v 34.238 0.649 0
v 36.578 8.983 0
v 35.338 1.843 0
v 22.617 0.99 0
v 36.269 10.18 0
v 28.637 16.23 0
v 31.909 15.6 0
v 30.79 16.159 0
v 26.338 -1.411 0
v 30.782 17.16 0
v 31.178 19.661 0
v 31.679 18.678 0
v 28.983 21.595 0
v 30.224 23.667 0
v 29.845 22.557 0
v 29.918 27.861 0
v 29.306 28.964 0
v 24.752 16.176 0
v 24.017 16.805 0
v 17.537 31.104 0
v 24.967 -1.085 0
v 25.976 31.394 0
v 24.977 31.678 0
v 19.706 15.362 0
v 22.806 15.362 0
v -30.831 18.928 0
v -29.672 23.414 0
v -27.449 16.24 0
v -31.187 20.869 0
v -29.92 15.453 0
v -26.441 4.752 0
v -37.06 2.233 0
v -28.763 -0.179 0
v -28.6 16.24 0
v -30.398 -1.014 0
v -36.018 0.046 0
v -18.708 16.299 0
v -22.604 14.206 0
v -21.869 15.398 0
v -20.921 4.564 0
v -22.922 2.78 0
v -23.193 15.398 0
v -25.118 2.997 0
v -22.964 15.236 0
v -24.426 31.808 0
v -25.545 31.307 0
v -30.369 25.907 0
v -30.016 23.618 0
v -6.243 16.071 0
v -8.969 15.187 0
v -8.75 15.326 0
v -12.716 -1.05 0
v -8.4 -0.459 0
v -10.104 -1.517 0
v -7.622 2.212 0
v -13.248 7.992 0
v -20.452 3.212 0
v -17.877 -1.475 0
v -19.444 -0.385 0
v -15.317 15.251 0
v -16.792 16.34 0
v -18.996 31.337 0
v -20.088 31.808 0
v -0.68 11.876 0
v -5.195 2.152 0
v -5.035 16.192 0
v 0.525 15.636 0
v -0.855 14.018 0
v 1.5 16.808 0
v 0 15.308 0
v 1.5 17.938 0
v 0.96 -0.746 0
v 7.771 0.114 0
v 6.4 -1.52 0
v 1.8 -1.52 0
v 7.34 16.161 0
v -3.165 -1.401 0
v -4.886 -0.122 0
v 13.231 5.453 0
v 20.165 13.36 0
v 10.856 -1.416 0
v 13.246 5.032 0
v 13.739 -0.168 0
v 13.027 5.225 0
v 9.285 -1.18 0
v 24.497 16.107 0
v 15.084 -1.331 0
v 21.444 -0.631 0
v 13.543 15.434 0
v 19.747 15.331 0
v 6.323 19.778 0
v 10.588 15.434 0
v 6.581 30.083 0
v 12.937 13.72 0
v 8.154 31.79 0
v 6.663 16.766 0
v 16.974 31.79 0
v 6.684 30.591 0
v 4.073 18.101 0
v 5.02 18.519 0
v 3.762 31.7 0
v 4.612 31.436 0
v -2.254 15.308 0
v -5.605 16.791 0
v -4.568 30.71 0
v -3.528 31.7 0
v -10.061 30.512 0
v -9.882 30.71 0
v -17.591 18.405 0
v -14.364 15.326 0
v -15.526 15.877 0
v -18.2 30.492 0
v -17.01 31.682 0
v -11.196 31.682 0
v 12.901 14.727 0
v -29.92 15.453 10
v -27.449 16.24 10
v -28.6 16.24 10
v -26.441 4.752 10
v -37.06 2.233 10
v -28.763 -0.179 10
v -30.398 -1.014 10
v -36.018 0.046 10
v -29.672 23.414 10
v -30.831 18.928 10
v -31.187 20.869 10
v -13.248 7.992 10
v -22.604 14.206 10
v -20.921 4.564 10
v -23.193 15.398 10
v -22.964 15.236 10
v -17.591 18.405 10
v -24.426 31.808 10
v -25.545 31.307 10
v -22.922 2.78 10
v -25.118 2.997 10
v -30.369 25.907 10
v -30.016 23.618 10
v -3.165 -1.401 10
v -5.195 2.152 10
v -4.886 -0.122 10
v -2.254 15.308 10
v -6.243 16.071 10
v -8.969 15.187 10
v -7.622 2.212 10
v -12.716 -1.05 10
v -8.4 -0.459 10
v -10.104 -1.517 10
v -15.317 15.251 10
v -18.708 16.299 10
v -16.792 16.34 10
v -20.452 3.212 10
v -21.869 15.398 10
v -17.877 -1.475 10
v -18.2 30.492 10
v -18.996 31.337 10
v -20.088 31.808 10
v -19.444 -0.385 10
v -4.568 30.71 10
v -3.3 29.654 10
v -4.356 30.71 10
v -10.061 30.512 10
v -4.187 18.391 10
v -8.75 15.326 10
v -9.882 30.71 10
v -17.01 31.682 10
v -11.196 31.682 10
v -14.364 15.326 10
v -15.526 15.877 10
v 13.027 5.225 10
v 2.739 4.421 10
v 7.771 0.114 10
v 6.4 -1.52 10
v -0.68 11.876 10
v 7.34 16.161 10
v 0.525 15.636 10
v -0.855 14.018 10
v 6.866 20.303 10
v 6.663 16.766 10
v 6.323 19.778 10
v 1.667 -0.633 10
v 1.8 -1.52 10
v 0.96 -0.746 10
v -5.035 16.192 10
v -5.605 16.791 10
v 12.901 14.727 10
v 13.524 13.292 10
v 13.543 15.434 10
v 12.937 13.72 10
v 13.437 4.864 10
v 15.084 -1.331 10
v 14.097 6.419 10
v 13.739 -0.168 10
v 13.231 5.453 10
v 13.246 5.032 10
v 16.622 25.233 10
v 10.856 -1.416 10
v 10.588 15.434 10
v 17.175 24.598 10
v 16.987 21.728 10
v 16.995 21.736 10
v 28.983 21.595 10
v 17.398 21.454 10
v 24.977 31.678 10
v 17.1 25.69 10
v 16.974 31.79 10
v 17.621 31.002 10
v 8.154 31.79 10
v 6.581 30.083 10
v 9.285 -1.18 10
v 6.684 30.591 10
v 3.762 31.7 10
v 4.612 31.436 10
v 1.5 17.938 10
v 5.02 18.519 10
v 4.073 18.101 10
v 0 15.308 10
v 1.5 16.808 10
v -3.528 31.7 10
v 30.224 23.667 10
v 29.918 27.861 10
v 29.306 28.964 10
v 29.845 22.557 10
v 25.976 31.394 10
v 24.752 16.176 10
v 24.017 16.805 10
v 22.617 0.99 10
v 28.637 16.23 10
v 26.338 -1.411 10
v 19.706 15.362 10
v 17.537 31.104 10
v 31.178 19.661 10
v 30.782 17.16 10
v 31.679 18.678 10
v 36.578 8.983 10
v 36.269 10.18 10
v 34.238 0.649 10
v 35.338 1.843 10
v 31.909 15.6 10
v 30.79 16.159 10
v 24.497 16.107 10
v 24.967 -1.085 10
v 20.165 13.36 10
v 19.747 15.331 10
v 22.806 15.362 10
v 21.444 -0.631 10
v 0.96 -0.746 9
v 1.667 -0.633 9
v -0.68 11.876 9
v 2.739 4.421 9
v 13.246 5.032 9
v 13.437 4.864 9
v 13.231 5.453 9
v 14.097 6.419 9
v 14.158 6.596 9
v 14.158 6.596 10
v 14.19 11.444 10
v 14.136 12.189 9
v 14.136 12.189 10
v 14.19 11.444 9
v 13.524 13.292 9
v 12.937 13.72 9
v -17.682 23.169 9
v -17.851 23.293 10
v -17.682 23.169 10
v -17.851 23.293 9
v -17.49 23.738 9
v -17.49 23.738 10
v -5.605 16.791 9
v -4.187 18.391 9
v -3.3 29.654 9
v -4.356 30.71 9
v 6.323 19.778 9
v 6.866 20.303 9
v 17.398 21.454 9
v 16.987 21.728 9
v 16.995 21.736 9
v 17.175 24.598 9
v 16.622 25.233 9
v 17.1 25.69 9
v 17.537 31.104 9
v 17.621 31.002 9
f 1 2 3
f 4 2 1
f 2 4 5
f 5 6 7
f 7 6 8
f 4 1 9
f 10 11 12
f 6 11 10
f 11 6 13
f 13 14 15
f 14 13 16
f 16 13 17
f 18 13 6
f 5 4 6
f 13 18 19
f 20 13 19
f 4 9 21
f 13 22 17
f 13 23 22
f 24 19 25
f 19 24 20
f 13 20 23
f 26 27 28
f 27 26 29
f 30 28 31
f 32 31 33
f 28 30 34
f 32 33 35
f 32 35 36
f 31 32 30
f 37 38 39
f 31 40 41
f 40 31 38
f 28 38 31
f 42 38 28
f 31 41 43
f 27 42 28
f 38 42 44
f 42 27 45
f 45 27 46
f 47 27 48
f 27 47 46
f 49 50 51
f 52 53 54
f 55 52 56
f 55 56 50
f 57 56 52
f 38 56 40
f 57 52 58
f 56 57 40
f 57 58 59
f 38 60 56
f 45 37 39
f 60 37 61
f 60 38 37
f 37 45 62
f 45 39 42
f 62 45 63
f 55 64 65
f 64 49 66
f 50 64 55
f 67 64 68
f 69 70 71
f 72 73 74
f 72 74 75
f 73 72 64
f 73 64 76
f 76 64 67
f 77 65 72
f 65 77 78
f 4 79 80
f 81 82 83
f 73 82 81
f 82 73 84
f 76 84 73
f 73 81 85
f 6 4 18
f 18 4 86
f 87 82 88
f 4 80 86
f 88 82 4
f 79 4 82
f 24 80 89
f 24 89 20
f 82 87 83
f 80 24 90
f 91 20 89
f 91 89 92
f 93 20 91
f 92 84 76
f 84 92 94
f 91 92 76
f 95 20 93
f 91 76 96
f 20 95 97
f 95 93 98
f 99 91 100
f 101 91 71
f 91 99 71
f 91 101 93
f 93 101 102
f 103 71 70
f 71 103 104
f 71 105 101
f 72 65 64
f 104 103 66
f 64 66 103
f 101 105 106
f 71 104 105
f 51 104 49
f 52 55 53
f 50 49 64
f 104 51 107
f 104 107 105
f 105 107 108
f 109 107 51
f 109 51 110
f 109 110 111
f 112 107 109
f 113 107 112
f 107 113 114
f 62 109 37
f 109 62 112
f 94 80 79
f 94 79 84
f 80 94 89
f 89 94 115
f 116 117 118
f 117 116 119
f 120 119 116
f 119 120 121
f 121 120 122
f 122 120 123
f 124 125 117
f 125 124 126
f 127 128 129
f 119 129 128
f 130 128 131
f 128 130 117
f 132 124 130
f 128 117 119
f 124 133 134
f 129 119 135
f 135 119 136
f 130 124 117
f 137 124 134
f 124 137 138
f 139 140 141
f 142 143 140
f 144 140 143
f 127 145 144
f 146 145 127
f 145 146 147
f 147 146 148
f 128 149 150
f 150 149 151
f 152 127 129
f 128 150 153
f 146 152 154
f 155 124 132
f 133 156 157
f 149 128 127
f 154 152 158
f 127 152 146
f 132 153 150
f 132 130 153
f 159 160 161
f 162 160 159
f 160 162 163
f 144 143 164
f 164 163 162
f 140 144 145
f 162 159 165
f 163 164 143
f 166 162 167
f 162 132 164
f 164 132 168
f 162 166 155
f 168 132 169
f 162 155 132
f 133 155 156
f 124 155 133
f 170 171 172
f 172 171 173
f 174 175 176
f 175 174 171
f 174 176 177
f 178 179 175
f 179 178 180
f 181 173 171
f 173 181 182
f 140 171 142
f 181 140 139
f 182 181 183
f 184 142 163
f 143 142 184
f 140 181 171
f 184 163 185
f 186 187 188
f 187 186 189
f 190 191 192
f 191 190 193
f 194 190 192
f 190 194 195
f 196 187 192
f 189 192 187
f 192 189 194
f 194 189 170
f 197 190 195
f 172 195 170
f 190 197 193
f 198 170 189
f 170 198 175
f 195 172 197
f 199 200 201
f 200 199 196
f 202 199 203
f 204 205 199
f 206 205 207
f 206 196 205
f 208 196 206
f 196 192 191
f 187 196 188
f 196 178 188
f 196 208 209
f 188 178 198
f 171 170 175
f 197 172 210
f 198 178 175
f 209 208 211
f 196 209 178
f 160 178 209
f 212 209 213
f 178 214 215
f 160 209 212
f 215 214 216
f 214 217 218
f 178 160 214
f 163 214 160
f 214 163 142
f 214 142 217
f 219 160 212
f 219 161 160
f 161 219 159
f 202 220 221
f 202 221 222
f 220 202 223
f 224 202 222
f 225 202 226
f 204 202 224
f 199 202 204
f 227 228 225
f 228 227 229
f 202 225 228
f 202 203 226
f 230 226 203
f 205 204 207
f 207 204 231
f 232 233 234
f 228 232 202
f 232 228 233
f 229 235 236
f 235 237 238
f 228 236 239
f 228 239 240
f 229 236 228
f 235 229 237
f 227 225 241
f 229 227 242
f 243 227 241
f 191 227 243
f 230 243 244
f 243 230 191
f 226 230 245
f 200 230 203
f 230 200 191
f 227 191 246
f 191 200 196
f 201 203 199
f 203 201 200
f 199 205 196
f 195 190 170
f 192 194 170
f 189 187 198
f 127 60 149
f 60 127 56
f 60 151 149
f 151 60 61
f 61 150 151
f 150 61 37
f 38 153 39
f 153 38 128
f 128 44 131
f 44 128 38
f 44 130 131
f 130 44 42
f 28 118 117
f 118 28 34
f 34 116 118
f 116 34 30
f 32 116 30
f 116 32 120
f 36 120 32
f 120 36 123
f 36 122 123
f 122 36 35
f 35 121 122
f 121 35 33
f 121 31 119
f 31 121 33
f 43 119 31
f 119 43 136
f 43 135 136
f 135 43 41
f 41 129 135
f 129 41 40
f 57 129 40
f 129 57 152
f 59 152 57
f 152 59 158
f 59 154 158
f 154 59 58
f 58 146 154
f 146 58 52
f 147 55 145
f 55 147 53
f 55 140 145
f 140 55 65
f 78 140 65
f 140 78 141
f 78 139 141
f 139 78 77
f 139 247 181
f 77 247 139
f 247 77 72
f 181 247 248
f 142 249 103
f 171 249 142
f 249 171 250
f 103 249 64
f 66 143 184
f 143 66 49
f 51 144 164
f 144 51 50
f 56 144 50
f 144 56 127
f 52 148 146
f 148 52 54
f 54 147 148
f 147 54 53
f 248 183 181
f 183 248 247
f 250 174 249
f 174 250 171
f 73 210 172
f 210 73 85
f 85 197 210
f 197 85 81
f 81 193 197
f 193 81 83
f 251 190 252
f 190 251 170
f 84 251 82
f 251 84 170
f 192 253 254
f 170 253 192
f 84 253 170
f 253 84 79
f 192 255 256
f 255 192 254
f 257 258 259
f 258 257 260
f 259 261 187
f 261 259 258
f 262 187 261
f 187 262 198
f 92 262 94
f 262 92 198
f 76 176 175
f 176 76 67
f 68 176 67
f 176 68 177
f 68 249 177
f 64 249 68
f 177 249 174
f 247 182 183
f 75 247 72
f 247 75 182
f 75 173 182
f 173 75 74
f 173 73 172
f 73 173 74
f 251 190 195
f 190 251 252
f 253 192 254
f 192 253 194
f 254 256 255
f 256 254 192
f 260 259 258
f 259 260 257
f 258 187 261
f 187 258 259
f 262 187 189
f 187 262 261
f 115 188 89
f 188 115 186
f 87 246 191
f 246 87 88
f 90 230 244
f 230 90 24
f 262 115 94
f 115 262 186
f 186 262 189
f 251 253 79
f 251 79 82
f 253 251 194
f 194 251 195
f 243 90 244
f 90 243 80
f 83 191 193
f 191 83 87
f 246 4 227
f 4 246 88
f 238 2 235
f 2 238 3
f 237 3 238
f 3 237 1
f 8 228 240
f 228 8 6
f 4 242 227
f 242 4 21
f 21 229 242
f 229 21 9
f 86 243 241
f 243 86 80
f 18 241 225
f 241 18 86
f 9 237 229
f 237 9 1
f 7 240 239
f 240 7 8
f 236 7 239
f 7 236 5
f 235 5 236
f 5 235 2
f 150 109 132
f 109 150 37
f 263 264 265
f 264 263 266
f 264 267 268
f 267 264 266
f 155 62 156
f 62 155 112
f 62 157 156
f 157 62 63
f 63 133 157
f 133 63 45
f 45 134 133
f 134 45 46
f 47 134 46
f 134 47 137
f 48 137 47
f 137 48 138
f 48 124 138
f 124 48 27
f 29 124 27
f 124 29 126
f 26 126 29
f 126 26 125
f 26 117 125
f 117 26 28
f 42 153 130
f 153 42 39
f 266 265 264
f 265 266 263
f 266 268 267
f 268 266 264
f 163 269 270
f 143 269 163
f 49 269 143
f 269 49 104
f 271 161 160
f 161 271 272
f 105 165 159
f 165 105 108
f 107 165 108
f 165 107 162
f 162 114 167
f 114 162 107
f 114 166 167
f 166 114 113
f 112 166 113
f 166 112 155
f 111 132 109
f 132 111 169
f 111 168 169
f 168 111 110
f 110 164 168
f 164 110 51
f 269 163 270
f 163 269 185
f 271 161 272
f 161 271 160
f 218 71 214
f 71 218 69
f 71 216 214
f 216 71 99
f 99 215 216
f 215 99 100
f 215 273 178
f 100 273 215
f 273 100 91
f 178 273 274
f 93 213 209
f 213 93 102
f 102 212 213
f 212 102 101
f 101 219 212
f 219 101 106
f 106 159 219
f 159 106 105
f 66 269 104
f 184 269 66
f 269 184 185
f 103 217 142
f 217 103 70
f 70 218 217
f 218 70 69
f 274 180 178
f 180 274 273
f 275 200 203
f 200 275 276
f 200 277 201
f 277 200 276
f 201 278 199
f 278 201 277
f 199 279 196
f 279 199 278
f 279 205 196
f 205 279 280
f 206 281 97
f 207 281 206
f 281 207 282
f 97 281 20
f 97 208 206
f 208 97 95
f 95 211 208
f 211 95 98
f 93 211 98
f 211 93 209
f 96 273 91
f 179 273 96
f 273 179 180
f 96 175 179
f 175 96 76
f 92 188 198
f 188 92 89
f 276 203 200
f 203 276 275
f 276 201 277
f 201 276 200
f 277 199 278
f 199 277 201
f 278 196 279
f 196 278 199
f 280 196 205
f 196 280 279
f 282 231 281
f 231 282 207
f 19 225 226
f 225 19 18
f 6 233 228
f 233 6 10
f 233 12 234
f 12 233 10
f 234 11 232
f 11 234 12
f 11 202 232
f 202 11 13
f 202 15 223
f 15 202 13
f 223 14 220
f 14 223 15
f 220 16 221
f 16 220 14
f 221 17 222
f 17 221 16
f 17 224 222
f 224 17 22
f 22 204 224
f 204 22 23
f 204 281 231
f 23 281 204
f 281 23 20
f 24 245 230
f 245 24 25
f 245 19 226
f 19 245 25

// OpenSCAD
// Choose your custom words and write them in UPPERCASE.
// If you want only one line, you can leave the second word empty.
word1 = "SUPER";
word2 = "MARIO";

// The following values are model constants and are not intended to be changed by the end user.
//-----------------
// [Fixed design parameters]

// Scale factor for the first word (word1)
scale_word1 = 1.8;

// Scale factor for the second word (word2)
scale_word2 = 2.0;

// Height of the extruded letters
scale_height = 5.0;

// Height of the brim (the base outline under the letters)
brim_height = 10;

// Radius/offset for the brim outline
brim_radius = 1.5;

// Vertical gap between the two words
gap = 2;

// Horizontal spacing between letters
spacing = 0.0;

// Thickness of the base of the brim
bottom_thickness = 10.00001;

// Small tolerance to help letters fit into the brim
wiggle = 0.1;




//-----------------

// Path data for each letter and symbol, used to draw the glyphs
// Each glyph is a list of 2D points (x, y), divided by 100 for scaling
glyph_A = [
    [449, 741], [765, 52], [463, 4], [439, 181], [196, 187], [141, -2], [-150, 50], [249, 721], [449, 741]
]/100;
glyph_B = [
    [138, 747], [485, 706], [565, 578], [559, 441], [507, 363], [580, 321], [629, 178], [573, 45], [457, 4], [21, 1], [1, 704], [138, 747]
]/100;
glyph_C = [
    [287, 744], [563, 726], [552, 461], [372, 545], [215, 472], [208, 302], [346, 208], [549, 314], [617, 35], [218, 0], [23, 171], [-35, 386], [55, 617], [287, 744]
]/100;
glyph_D = [
    [368, 744], [578, 572], [621, 171], [414, 2], [0, 2], [0, 699], [368, 744]
]/100;
glyph_E = [
    [54, 745], [544, 745], [503, 538], [262, 501], [259, 450], [472, 434], 
    [462, 275], [272, 258], [289, 204], [520, 202], [605, 3], [54, 3], 
    [0, 481], [54, 745]
]/100;
glyph_F = [
    [49, 746], [553, 742], [525, 501], [250, 532], [246, 452], [479, 464], [441, 244], [246, 269], [288, 3], [22, 3], [1, 543], [49, 746]
]/100;
glyph_G = [
    [627, 591], [456, 495], [387, 533], [285, 502], [224, 357], [288, 222], [472, 244], [476, 277], [334, 264], [352, 465], [648, 461], [648, 66], [151, 2], [0, 309], [55, 591], [267, 745], [527, 727], [627, 591]
]/100;
glyph_H = [
    [0, 698], [252, 746], [264, 441], [411, 463], [420, 732], [626, 723], [666, 5], [434, 13], [432, 238], [292, 211], [297, 5], [80, 5],
    [0, 698]
]/100;
glyph_I = [
    [5, 739], [199, 751], [349, 43], [31, 8], [5, 739]
]/100;
glyph_J = [
    [0, 739], [219, 744], [658, 724], [658, 528], [459, 509],
    [533, 162], [430, 32], [235, 0], [18, 0], [25, 220],
    [263, 237], [236, 509], [0, 528], [0, 739]
]/100;
glyph_K = [
    [14, 741], [223, 741], [218, 539], [375, 718], [518, 566],
    [337, 369], [605, 178], [440, 0], [216, 243], [257, -2],
    [0, -2], [14, 741]
]/100;
glyph_L = [
    [278, 717], [249, 269], [556, 306], [584, 75], [28, 9],
    [0, 749], [278, 717]
]/100;
glyph_M = [
    [0, 76], [357, 737], [568, 737], [638, 537], [762, 738],
    [949, 742], [1154, 23], [887, 1], [836, 183], [775, 359],
    [591, 195], [450, 382], [281, 23], [0, 76]
]/100;
glyph_N = [
    [0, 13], [133, 742], [284, 742], [425, 510], [437, 742],
    [669, 706], [620, 4], [428, 16], [280, 242], [237, 3],
    [0, 13]
]/100;
glyph_O = [
    [522, 733], [740, 462], [678, 105], [283, 2], [-32, 280],
    [15, 593], [250, 742], [522, 733]
]/100;
glyph_P = [
    [442, 740], [618, 619], [632, 323], [454, 151], [233, 137], [233, -4], [0, -4], [37, 740], [442, 740]
]/100;
glyph_Q =[
    [531, 731], [721, 478], [653, 216], [797, 84], [621, -2], [535, 61], [238, -3], [-21, 243], [26, 593], [260, 740], [531, 731]
]/100;
glyph_R = [
    [415, 739], [600, 604], [617, 371], [513, 255], [698, 92], [481, -2], [254, 192], [288, -1], [58, -1], [0, 707], [415, 739]
]/100;
glyph_S = [
    [725, 556], [596, 397], [445, 494], [407, 446], [677, 248], [546, 1], [225, 1], [1, 179], [98, 342], [291, 233],
    [320, 278], [37, 446], [305, 746], [546, 746], [725, 556]
]/100;
glyph_T = [
    [0, 742], [739, 729], [739, 429], [489, 470], [558, -1], [200, -1], [254, 470], [0, 483], [0, 742]
]/100;
glyph_U = [
    [-9, 739], [314, 739], [299, 234], [424, 324], [387, 685], [694, 685], [694, 199], [515, -3], [138, -3], [-9, 177], [-9, 739]
]/100;
glyph_V = [
    [0, 745], [259, 731], [362, 284], [401, 334], [512, 731], [799, 745], [517, 3], [169, 29], [0, 745]
]/100;
glyph_W = [
    [1028, 675], [709, 6], [523, 6], [454, 207], [352, 5], [182, 0], [0, 723], [238, 744], [283, 562], [337, 385], [502, 550], [627, 362], [778, 729], [1028, 675]
]/100;
glyph_X = [
    [200, 739], [357, 579], [473, 750], [663, 568], [525, 405], [753, 226], [563, 7], [399, 221], [191, 12], [0, 201], [221, 400], [53, 588], [200, 739]
]/100;
glyph_Y = [
    [71, 733], [236, 557], [391, 753], [610, 588], [371, 380], [548, 13], [156, 31], [156, 350], [-93, 588], [71, 733]
]/100;
glyph_Z = [
    [617, 3], [0, 28], [0, 228], [248, 486], [0, 471], [44, 748], [625, 707], [614, 517], [386, 265], [625, 300], [617, 3]
]/100;
glyph_0 = [
    [381, 732], [552, 531], [497, 90], [224, 1], [3, 223], [48, 606], [202, 742], [381, 732], [560, 732]
]/100;
glyph_1 = [
    [527, 727], [468, 205], [679, 232], [713, 1], [0, 1], [20, 218], [258, 205], [258, 476], [133, 397], [0, 578], [269, 741], [527, 741]
]/100;
glyph_2 = [
    [4, 605], [211, 742], [392, 741], [544, 629], [610, 352], [411, 221], [629, 239], [686, 1], [110, 9], [34, 156], [330, 390], [309, 454], [261, 492], [140, 409], [4, 605]
]/100;
glyph_3 = [
    [1, 607], [178, 740], [403, 708], [511, 522], [441, 421], [528, 357], [534, 131], [415, 1], [148, 26], [1, 175], [120, 291], [220, 197], [314, 222], [317, 279], [170, 329], [176, 419], [295, 498], [264, 531], [97, 454], [1, 607]
]/100;
glyph_4 = [
    [531, 409], [689, 402], [689, 223], [548, 214], [575, 31], [318, 4], [314, 214], [8, 214], [4, 400], [208, 747], [487, 728], [531, 409]
]/100;
glyph_5 = [
    [572, 741], [530, 543], [247, 546], [253, 501], [415, 495], [610, 389], [609, 166], [534, 45], [189, 10], [7, 95], [88, 248], [212, 205], [324, 200], [368, 251], [318, 298], [91, 293], [10, 433], [0, 724], [572, 741]
]/100;
glyph_6 = [
    [154, 719], [335, 746], [515, 709], [447, 499], [286, 559], [211, 500], [202, 444], [416, 438], [501, 300], [499, 120], [380, 1], [136, 1], [0, 120], [0, 371], [28, 575], [154, 719]
]/100;
glyph_7 = [
    [0, 740], [641, 726], [524, -3], [234, 66], [393, 501], [51, 473], [0, 740]
]/100;
glyph_8 = [
    [461, 716], [533, 519], [446, 450], [562, 355], [577, 61], [414, -3], [154, -3], [0, 87], [17, 351], [139, 444], [46, 519], [116, 745], [461, 716]
]/100;
glyph_9 = [
    [306, 747], [533, 593], [524, 320], [447, 127], [116, 1], [0, 161], [264, 230], [319, 327], [137, 313], [0, 463], [36, 677], [306, 747]
]/100;
glyph_at = [
    [422, 103], [606, 184], [657, 125], [441, 2], [160, 63], [3, 349], [116, 715], [381, 854], [786, 684], [869, 344], [800, 248], [744, 167], [636, 182], [594, 233], [461, 169], [234, 206], [183, 482], [323, 672], [510, 664], [596, 607], [599, 637], [670, 600], [653, 418], [677, 260], [722, 243], [783, 364], [710, 615], [385, 748], [197, 637], [119, 371], [212, 165], [422, 103]
]/100;
glyph_b_l = [
    [233, 856], [241, 782], [89, 795], [84, -15], [241, 15], [241, -83], [7, -98], [2, 866], [233, 856]
]/100;
glyph_b_r = [
    [9, -88], [1, -14], [153, -27], [158, 783], [1, 753], [1, 851], [235, 866], [240, -98], [9, -88]
]/100;
glyph_per = [
    [389, 745], [572, 774], [206, 33], [0, 4], [389, 745], [475, 293], [544, 213], [522, 35], [412, 0], [324, 88], [342, 242], [404, 297], [475, 293], [389, 745], [191, 768], [260, 687], [238, 510], [128, 474], [38, 564], [57, 717], [119, 771], [191, 768], [389, 745]
]/100;
glyph_num = [
    [395, 778], [292, 29], [156, 0], [274, 749], [395, 778],
    
    [544, 749], [665, 778], [563, 29], [426, 0], [544, 749], 
    
   [718, 601], [810, 451], [113, 429], [4, 594], [718, 601],  
    
    [733, 328], [832, 169], [135, 147], [60, 316], [733, 328], [718, 601], [544, 749], [395, 778]
]/100;
glyph_dol = [
    [664, 550], [546, 405], [431, 528], [289, 576], [254, 531], [664, 256], [500, 42], [206, 42], [1, 205], [90, 354], [259, 208], [444, 163], [471, 204], [34, 450], [279, 724], [500, 724], 
    [424, 794], [341, 795], [283, -32], [399, -20], [424, 794], [500, 724]
]/100;
glyph_asc = [
    [278, 582], [164, 765], [68, 601], [8, 638], [164, 882], [348, 593], [278, 582]
]/100;
glyph_bar = [
    [60, -121], [5, -121], [3, 853], [58, 853], [60, 974], [115, 974], [60, -121]
]/100;
glyph_ast = [
    [67, 719], [97, 720], [93, 653], [144, 696], [158, 662], [99, 638], [161, 608], [141, 585], [93, 620], [99, 558], [49, 561], [55, 620], [22, 617], [28, 676], [78, 640], [28, 699], [95, 673], [95, 730], [45, 694], [23, 722], [90, 748], [38, 784], [67, 719]
]/100;
glyph_col = [
    [92, 179], [164, 144], [172, 49], [114, 8], [50, 20], [20, 52], [10, 136], [92, 179], [97, 320], [170, 386], [167, 456], [84, 503], [16, 463], [22, 362], [97, 320]
]/100;
//glyph_scol = [
    //[72, 456], [139, 496], [220, 450], [223, 381], [154, 317], [81, 358], [89, 95], [164, 91], [142, -17], [61, -92], [11, -92], [80, 5]
//]/100;
glyph_dot = [
    [107, 173], [186, 173], [233, 91], [200, 30], [107, 9], [64, 82], [107, 173]
]/100;
glyph_sl = [
    [375, 727], [551, 755], [198, 41], [0, 13], [375, 727]
]/100;
glyph_add = [
    [222, 524], [220, 424], [323, 434], [336, 320], [220, 325], [233, 221], [125, 213], [116, 325], [15, 328], [-2, 423], [119, 423], [108, 529], [222, 524]
]/100;
glyph_com = [
    [58, 81], [138, 76], [114, -39], [28, -119], [-25, -119], [48, -15], [58, 81]
]/100;
glyph_dif = [
    [6, 342], [1, 431], [325, 471], [341, 354], [6, 342]
]/100;
glyph_equ = [
    [5, 299], [0, 353], [305, 377], [320, 307], [5, 299], [5, 435], [0, 488], [305, 512], [320, 442], [5, 435]
]/100;
glyph_que = [
    [242, 144], [298, 68], [263, 3], [174, 0], [138, 54], [162, 140], [242, 144],
    [256, 465], [284, 573], [226, 609], [138, 528], [0, 671], [131, 779], [308, 779], [437, 623], [432, 424], [293, 330], [308, 190], [126, 190], [105, 345], [256, 465], [242, 144]
]/100;
glyph_exc = [
    [213, 219], [93, 210], [0, 768], [197, 796], [213, 219],[71, 78], [106, 144], [197, 148], [233, 92], [209, 4], [128, 1], [71, 78]
]/100;
glyph_les = [
    [37, 785], [91, 776], [91, 665], [38, 593], [-3, 609], [38, 691], [205, 776], [205, 665], [152, 593], [99, 609], [140, 691], [139, 785],
    [205, 776], [205, 665], [152, 593], [99, 609], [140, 691], [139, 785]
]/100;
glyph_pr = [
    [0, 785], [71, 785], [175, 658], [251, 402], [240, 130], [200, 2], [80, -100], [33, -80], [120, 41], [150, 268], [119, 498], [0, 785]
]/100;
glyph_pl = [
    [250, 780], [132, 622], [67, 392], [92, 166], [218, -62], [130, -62], [80, 40], [20, 194], [0, 465], [76, 721], [120, 800], [220, 860], [354, 890], [354, 800]
]/100;
glyph_uns = [
    [0, -28], [0, 27], [728, 27], [728, -28], [0, -28]
]/100;
glyph_qus = [
    [37, 785], [91, 776], [91, 665], [38, 593], [-3, 609], [38, 691], [37, 785]
]/100;

// Path data for the holes in the letters and symbols
hole_A = [
    [300, 479], [259, 377], [412, 373], [377, 476], [323, 479]
]/100;
hole_B = [
    [257, 152], [359, 174], [359, 242], [257, 277], [257, 152], [244, 462], [345, 483], [345, 565], [244, 587], [244, 462]
]/100;
hole_D = [
    [229, 477], [229, 259], [364, 306], [364, 415], [229, 477]
]/100;
hole_O = [
    [309, 481], [258, 367], [346, 308], [439, 342], [434, 453], [309, 481]
]/100;
hole_P = [
    [274, 512], [267, 391], [333, 382], [417, 481], [274, 512]
]/100;
hole_Q = [
    [228, 477], [221, 272], [385, 223], [294, 313], [426, 409], [505, 336], [532, 388], [432, 523], [228, 477]
]/100;
hole_R = [
    [254, 532], [248, 390], [309, 382], [370, 470], [254, 532]
]/100;
hole_0 = [
    [257, 488], [235, 324], [279, 287], [327, 321], [318, 462], [257, 462]

]/100;
hole_4 = [
    [216, 409], [305, 409], [297, 513], [216, 409]
]/100;
hole_6 = [
    [258, 267], [211, 244], [213, 185], [292, 185], [308, 249], [258, 267]
]/100;
hole_8 = [
    [364, 259], [306, 283], [248, 259], [248, 211], [306, 187], [364, 211], [364, 259], [332, 587], [288, 605], [244, 587], [244, 551], [288, 533], [332, 551], [332, 587]
]/100;
hole_9 = [
    [225, 480], [312, 480], [321, 527], [281, 560], [225, 527], [225, 480]
]/100;
hole_at = [
    [381, 514], [336, 445], [365, 351], [451, 351], [508, 418], [479, 504], [381, 514]
]/100;
hole_per = [
    [426, 195], [417, 129], [435, 114], [454, 128], [451, 185], [426, 195],
    [141, 670], [132, 604], [149, 589], [169, 603], [165, 659], [141, 670]
]/100;
// Width of the letters
width = [765-100/*A*/, 629-1/*B*/, 617+35/*C*/, 621-0/*D*/, 605-25/*E*/, 553-1/*F*/, 648-0/*G*/, 666-0/*H*/, 350-50/*I*/, 658-0/*J*/, 540-0/*K*/, 584-0/*L*/, 1154-0/*M*/, 669-0/*N*/, 740+32/*O*/, 632-0/*P*/, 797+21/*Q*/, 698-15/*R*/, 725+1/*S*/, 739-0/*T*/, 694+9/*U*/, 799-0/*V*/, 1028-0/*W*/, 753-0/*X*/, 610+93/*Y*/, 625-0/*Z*/, 560-3/*0*/, 620/*1*/, 686-4/*2*/, 600/*3*/, 689-4/*4*/, 680/*5*/, 515/*6*/, 641/*7*/, 577/*8*/, 533/*9*/, 869/*@*/, 240/*[*/, 240/*]*/, 572/*%*/, 572/*#*/, 664/*$*/, 348/*^*/, 115/*|*/, 161/***/, 172+79/*:*/, 220/*;*/, 270/*.*/, 551/*/*/, 336/*+*/, 160/*,*/, 330/*-*/, 310/*=*/, 430/*?*/, 230/*!*/, 882/*<*/, 251/*)*/, 354/*(*/, 728/*_*/, 90/*'*/]/100;
width_A = width[0];
width_B = width[1];
width_C = width[2];
width_D = width[3];
width_E = width[4];
width_F = width[5];
width_G = width[6];
width_H = width[7];
width_I = width[8];
width_J = width[9];
width_K = width[10];
width_L = width[11];
width_M = width[12];
width_N = width[13];
width_O = width[14];
width_P = width[15];
width_Q = width[16];
width_R = width[17];
width_S = width[18];
width_T = width[19];
width_U = width[20];
width_V = width[21];
width_W = width[22];
width_X = width[23];
width_Y = width[24];
width_Z = width[25];
width_0 = width[26];
width_1 = width[27];
width_2 = width[28];
width_3 = width[29];
width_4 = width[30];
width_5 = width[31];
width_6 = width[32];
width_7 = width[33];
width_8 = width[34];
width_9 = width[35];
width_at = width[36];
width_b_l = width[37];
width_b_r = width[38];
width_per = width[39];
width_num = width[40];
width_dol = width[41];
width_asc = width[42];
width_bar = width[43];
width_ast = width[44];
width_col = width[45];
width_scol = width[46];
width_dot = width[47];
width_sl = width[48];
width_add = width[49];
width_com = width[50];
width_dif = width[51];
width_equ = width[52];
width_que = width[53];
width_exc = width[54];
width_les = width[55];
width_pr = width[56];
width_pl = width[57];
width_uns = width[58];
width_qus = width[59];
// Function that returns the path data for any supported letter or symbol
function glyph_sorter_all(letter) =
    letter == "A" ? (glyph_A) :
    letter == "B" ? (glyph_B) :
    letter == "C" ? (glyph_C) :
    letter == "D" ? (glyph_D) :
    letter == "E" ? (glyph_E) :
    letter == "F" ? (glyph_F) :
    letter == "G" ? (glyph_G) :
    letter == "H" ? (glyph_H) :
    letter == "I" ? (glyph_I) :
    letter == "J" ? (glyph_J) :
    letter == "K" ? (glyph_K) :
    letter == "L" ? (glyph_L) :
    letter == "M" ? (glyph_M) :
    letter == "N" ? (glyph_N) :
    letter == "O" ? (glyph_O) :
    letter == "P" ? (glyph_P) :
    letter == "Q" ? (glyph_Q) :
    letter == "R" ? (glyph_R) :
    letter == "S" ? (glyph_S) :
    letter == "T" ? (glyph_T) :
    letter == "U" ? (glyph_U) :
    letter == "V" ? (glyph_V) :
    letter == "W" ? (glyph_W) :
    letter == "X" ? (glyph_X) :
    letter == "Y" ? (glyph_Y) :
    letter == "Z" ? (glyph_Z) :
    letter == "0" ? (glyph_0) :
    letter == "1" ? (glyph_1) :
    letter == "2" ? (glyph_2) :
    letter == "3" ? (glyph_3) :
    letter == "4" ? (glyph_4) :
    letter == "5" ? (glyph_5) :
    letter == "6" ? (glyph_6) :
    letter == "7" ? (glyph_7) :
    letter == "8" ? (glyph_8) :
    letter == "9" ? (glyph_9) :
    letter == "@" ? (glyph_at) :
    letter == "[" ? (glyph_b_l) :
    letter == "]" ? (glyph_b_r) :
    letter == "%" ? (glyph_per) :
    letter == "#" ? (glyph_num) :
    letter == "$" ? (glyph_dol) :
    letter == "^" ? (glyph_asc) :
    letter == "|" ? (glyph_bar) :
    letter == "*" ? (glyph_ast) :
    letter == ":" ? (glyph_col) :
    letter == ";" ? (glyph_scol) :
    letter == "." ? (glyph_dot) :
    letter == "/" ? (glyph_sl) :
    letter == "+" ? (glyph_add) :
    letter == "," ? (glyph_com) :
    letter == "-" ? (glyph_dif) :
    letter == "=" ? (glyph_equ) :
    letter == "?" ? (glyph_que) :
    letter == "!" ? (glyph_exc) :
    letter == "<" ? (glyph_les) :
    letter == ")" ? (glyph_pr) :
    letter == "(" ? (glyph_pl) :
    letter == "_" ? (glyph_uns) :
    letter == "'" ? (glyph_qus) :
    0; // Default value for unsupported letters

// Function that returns the path data for a subset of letters/symbols (used for solid letters)
function glyph_sorter(letter) =
    letter == "C" ? (glyph_C) :
    letter == "E" ? (glyph_E) :
    letter == "F" ? (glyph_F) :
    letter == "G" ? (glyph_G) :
    letter == "H" ? (glyph_H) :
    letter == "I" ? (glyph_I) :
    letter == "J" ? (glyph_J) :
    letter == "K" ? (glyph_K) :
    letter == "L" ? (glyph_L) :
    letter == "M" ? (glyph_M) :
    letter == "N" ? (glyph_N) :
    letter == "S" ? (glyph_S) :
    letter == "T" ? (glyph_T) :
    letter == "U" ? (glyph_U) :
    letter == "V" ? (glyph_V) :
    letter == "W" ? (glyph_W) :
    letter == "X" ? (glyph_X) :
    letter == "Y" ? (glyph_Y) :
    letter == "Z" ? (glyph_Z) :
    letter == "1" ? (glyph_1) :
    letter == "2" ? (glyph_2) :
    letter == "3" ? (glyph_3) :
    letter == "5" ? (glyph_5) :
    letter == "7" ? (glyph_7) :
    letter == "[" ? (glyph_b_l) :
    letter == "]" ? (glyph_b_r) :
    letter == "#" ? (glyph_num) :
    letter == "$" ? (glyph_dol) :
    letter == "^" ? (glyph_asc) :
    letter == "|" ? (glyph_bar) :
    letter == "*" ? (glyph_ast) :
    letter == ":" ? (glyph_col) :
    letter == ";" ? (glyph_scol) :
    letter == "." ? (glyph_dot) :
    letter == "/" ? (glyph_sl) :
    letter == "+" ? (glyph_add) :
    letter == "," ? (glyph_com) :
    letter == "-" ? (glyph_dif) :
    letter == "=" ? (glyph_equ) :
    letter == "?" ? (glyph_que) :
    letter == "!" ? (glyph_exc) :
    letter == "<" ? (glyph_les) :
    letter == ")" ? (glyph_pr) :
    letter == "(" ? (glyph_pl) :
    letter == "_" ? (glyph_uns) :
    letter == "'" ? (glyph_qus) :
    0; // Default value for unsupported letters





// Function that returns the width of a letter or symbol, used for spacing
function width_letter(letter) =
    letter == "A" ? (width_A) :
    letter == "B" ? (width_B) :
    letter == "C" ? (width_C) :
    letter == "D" ? (width_D) :
    letter == "E" ? (width_E) :
    letter == "F" ? (width_F) :
    letter == "G" ? (width_G) :
    letter == "H" ? (width_H) :
    letter == "I" ? (width_I) :
    letter == "J" ? (width_J) :
    letter == "K" ? (width_K) :
    letter == "L" ? (width_L) :
    letter == "M" ? (width_M) :
    letter == "N" ? (width_N) :
    letter == "O" ? (width_O) :
    letter == "P" ? (width_P) :
    letter == "Q" ? (width_Q) :
    letter == "R" ? (width_R) :
    letter == "S" ? (width_S) :
    letter == "T" ? (width_T) :
    letter == "U" ? (width_U) :
    letter == "V" ? (width_V) :
    letter == "W" ? (width_W) :
    letter == "X" ? (width_X) :
    letter == "Y" ? (width_Y) :
    letter == "Z" ? (width_Z) :
    letter == "0" ? (width_0) :
    letter == "1" ? (width_1) :
    letter == "2" ? (width_2) :
    letter == "3" ? (width_3) :
    letter == "4" ? (width_4) :
    letter == "5" ? (width_5) :
    letter == "6" ? (width_6) :
    letter == "7" ? (width_7) :
    letter == "8" ? (width_8) :
    letter == "9" ? (width_9) :
    letter == "@" ? (width_at) :
    letter == "[" ? (width_b_l) :
    letter == "]" ? (width_b_r) :
    letter == "%" ? (width_per) :
    letter == "#" ? (width_num) :
    letter == "$" ? (width_dol) :
    letter == "^" ? (width_asc) :
    letter == "|" ? (width_bar) :
    letter == "*" ? (width_ast) :
    letter == ":" ? (width_col) :
    letter == ";" ? (width_scol) :
    letter == "." ? (width_dot) :
    letter == "/" ? (width_sl) :
    letter == "+" ? (width_add) :
    letter == "," ? (width_com) :
    letter == "-" ? (width_dif) :
    letter == "=" ? (width_equ) :
    letter == "?" ? (width_que) :
    letter == "!" ? (width_exc) :
    letter == "<" ? (width_les) :
    letter == ")" ? (glyph_pr) :
    letter == "(" ? (glyph_pl) :
    letter == "_" ? (glyph_uns) :
    letter == "'" ? (glyph_qus) :
    0; // Default value for unsupported letters

// Module that draws a glyph with a small positive offset for tolerance
module draw_glyph(paths, height=1)
{
    linear_extrude(height) offset(wiggle)
    polygon(paths); 
}


// Module that draws the brim (outline) of a glyph with brim_radius
module draw_glyph_brim(paths, height=1)
{
    linear_extrude(height) offset(brim_radius) polygon(paths);
}


// Module that renders both words, positioning them correctly
module call_words(brim, k)
{
    // Render the second word, centered horizontally
    translate([-total_width(word2, scale_word2) / 2, 0, 0])
    {
        render_word(word2, scale_height, scale_word2, k, brim);
    }
    // Render the first word, centered horizontally and shifted vertically
    translate([-total_width(word1, scale_word1) / 2, 7.44 * scale_word2 + gap, 0])
    {
        render_word(word1, scale_height, scale_word1, k, brim);
    }
}

// Module that renders a single letter
module render_letter(letter, height, i, pre_letter, scale, k, brim)
{
    difference()
    {
        draw_glyph_brim(glyph_sorter_all(letter)*scale,brim);
        translate([0,0,bottom_thickness])
        {
            draw_glyph(glyph_sorter_all(letter)*scale, height);
            translate([-width_letter(pre_letter)*scale - spacing, 0, -1])draw_glyph_brim(glyph_sorter_all(pre_letter)*scale, height+2);
        };
    }

}


// Module that renders a word, letter by letter, with correct spacing
module render_word(word, height=1, scale, k, brim)
{
    for (i = [0 : len(word) - 1])
    {
        translate([spacing_letter(i, str(word[i]), word, scale), 0, 0])
        {
            render_letter(str(word[i]), height, i, i == 0 ? "" : str(word[i-1]), scale, k, brim);
        }
    }
}

// Function that calculates the X offset for each letter in a word
function spacing_letter(i, letter, word, scale)
= i == 0 ? 0 : spacing_letter(i-1, str(word[i-1]), word, scale) + width_letter(str(word[i-1])) * scale + spacing;

// Function that calculates the total width of a word
function total_width(word, scale) = spacing_letter(len(word)-1, str(word[len(word)-1]), word, scale) + width_letter(str(word[len(word)-1])) * scale;

// Main module: renders both words with brim only (outline)
module brim_main() 
{
    // Only outline
    call_words(brim_height, true);
}

brim_main();
